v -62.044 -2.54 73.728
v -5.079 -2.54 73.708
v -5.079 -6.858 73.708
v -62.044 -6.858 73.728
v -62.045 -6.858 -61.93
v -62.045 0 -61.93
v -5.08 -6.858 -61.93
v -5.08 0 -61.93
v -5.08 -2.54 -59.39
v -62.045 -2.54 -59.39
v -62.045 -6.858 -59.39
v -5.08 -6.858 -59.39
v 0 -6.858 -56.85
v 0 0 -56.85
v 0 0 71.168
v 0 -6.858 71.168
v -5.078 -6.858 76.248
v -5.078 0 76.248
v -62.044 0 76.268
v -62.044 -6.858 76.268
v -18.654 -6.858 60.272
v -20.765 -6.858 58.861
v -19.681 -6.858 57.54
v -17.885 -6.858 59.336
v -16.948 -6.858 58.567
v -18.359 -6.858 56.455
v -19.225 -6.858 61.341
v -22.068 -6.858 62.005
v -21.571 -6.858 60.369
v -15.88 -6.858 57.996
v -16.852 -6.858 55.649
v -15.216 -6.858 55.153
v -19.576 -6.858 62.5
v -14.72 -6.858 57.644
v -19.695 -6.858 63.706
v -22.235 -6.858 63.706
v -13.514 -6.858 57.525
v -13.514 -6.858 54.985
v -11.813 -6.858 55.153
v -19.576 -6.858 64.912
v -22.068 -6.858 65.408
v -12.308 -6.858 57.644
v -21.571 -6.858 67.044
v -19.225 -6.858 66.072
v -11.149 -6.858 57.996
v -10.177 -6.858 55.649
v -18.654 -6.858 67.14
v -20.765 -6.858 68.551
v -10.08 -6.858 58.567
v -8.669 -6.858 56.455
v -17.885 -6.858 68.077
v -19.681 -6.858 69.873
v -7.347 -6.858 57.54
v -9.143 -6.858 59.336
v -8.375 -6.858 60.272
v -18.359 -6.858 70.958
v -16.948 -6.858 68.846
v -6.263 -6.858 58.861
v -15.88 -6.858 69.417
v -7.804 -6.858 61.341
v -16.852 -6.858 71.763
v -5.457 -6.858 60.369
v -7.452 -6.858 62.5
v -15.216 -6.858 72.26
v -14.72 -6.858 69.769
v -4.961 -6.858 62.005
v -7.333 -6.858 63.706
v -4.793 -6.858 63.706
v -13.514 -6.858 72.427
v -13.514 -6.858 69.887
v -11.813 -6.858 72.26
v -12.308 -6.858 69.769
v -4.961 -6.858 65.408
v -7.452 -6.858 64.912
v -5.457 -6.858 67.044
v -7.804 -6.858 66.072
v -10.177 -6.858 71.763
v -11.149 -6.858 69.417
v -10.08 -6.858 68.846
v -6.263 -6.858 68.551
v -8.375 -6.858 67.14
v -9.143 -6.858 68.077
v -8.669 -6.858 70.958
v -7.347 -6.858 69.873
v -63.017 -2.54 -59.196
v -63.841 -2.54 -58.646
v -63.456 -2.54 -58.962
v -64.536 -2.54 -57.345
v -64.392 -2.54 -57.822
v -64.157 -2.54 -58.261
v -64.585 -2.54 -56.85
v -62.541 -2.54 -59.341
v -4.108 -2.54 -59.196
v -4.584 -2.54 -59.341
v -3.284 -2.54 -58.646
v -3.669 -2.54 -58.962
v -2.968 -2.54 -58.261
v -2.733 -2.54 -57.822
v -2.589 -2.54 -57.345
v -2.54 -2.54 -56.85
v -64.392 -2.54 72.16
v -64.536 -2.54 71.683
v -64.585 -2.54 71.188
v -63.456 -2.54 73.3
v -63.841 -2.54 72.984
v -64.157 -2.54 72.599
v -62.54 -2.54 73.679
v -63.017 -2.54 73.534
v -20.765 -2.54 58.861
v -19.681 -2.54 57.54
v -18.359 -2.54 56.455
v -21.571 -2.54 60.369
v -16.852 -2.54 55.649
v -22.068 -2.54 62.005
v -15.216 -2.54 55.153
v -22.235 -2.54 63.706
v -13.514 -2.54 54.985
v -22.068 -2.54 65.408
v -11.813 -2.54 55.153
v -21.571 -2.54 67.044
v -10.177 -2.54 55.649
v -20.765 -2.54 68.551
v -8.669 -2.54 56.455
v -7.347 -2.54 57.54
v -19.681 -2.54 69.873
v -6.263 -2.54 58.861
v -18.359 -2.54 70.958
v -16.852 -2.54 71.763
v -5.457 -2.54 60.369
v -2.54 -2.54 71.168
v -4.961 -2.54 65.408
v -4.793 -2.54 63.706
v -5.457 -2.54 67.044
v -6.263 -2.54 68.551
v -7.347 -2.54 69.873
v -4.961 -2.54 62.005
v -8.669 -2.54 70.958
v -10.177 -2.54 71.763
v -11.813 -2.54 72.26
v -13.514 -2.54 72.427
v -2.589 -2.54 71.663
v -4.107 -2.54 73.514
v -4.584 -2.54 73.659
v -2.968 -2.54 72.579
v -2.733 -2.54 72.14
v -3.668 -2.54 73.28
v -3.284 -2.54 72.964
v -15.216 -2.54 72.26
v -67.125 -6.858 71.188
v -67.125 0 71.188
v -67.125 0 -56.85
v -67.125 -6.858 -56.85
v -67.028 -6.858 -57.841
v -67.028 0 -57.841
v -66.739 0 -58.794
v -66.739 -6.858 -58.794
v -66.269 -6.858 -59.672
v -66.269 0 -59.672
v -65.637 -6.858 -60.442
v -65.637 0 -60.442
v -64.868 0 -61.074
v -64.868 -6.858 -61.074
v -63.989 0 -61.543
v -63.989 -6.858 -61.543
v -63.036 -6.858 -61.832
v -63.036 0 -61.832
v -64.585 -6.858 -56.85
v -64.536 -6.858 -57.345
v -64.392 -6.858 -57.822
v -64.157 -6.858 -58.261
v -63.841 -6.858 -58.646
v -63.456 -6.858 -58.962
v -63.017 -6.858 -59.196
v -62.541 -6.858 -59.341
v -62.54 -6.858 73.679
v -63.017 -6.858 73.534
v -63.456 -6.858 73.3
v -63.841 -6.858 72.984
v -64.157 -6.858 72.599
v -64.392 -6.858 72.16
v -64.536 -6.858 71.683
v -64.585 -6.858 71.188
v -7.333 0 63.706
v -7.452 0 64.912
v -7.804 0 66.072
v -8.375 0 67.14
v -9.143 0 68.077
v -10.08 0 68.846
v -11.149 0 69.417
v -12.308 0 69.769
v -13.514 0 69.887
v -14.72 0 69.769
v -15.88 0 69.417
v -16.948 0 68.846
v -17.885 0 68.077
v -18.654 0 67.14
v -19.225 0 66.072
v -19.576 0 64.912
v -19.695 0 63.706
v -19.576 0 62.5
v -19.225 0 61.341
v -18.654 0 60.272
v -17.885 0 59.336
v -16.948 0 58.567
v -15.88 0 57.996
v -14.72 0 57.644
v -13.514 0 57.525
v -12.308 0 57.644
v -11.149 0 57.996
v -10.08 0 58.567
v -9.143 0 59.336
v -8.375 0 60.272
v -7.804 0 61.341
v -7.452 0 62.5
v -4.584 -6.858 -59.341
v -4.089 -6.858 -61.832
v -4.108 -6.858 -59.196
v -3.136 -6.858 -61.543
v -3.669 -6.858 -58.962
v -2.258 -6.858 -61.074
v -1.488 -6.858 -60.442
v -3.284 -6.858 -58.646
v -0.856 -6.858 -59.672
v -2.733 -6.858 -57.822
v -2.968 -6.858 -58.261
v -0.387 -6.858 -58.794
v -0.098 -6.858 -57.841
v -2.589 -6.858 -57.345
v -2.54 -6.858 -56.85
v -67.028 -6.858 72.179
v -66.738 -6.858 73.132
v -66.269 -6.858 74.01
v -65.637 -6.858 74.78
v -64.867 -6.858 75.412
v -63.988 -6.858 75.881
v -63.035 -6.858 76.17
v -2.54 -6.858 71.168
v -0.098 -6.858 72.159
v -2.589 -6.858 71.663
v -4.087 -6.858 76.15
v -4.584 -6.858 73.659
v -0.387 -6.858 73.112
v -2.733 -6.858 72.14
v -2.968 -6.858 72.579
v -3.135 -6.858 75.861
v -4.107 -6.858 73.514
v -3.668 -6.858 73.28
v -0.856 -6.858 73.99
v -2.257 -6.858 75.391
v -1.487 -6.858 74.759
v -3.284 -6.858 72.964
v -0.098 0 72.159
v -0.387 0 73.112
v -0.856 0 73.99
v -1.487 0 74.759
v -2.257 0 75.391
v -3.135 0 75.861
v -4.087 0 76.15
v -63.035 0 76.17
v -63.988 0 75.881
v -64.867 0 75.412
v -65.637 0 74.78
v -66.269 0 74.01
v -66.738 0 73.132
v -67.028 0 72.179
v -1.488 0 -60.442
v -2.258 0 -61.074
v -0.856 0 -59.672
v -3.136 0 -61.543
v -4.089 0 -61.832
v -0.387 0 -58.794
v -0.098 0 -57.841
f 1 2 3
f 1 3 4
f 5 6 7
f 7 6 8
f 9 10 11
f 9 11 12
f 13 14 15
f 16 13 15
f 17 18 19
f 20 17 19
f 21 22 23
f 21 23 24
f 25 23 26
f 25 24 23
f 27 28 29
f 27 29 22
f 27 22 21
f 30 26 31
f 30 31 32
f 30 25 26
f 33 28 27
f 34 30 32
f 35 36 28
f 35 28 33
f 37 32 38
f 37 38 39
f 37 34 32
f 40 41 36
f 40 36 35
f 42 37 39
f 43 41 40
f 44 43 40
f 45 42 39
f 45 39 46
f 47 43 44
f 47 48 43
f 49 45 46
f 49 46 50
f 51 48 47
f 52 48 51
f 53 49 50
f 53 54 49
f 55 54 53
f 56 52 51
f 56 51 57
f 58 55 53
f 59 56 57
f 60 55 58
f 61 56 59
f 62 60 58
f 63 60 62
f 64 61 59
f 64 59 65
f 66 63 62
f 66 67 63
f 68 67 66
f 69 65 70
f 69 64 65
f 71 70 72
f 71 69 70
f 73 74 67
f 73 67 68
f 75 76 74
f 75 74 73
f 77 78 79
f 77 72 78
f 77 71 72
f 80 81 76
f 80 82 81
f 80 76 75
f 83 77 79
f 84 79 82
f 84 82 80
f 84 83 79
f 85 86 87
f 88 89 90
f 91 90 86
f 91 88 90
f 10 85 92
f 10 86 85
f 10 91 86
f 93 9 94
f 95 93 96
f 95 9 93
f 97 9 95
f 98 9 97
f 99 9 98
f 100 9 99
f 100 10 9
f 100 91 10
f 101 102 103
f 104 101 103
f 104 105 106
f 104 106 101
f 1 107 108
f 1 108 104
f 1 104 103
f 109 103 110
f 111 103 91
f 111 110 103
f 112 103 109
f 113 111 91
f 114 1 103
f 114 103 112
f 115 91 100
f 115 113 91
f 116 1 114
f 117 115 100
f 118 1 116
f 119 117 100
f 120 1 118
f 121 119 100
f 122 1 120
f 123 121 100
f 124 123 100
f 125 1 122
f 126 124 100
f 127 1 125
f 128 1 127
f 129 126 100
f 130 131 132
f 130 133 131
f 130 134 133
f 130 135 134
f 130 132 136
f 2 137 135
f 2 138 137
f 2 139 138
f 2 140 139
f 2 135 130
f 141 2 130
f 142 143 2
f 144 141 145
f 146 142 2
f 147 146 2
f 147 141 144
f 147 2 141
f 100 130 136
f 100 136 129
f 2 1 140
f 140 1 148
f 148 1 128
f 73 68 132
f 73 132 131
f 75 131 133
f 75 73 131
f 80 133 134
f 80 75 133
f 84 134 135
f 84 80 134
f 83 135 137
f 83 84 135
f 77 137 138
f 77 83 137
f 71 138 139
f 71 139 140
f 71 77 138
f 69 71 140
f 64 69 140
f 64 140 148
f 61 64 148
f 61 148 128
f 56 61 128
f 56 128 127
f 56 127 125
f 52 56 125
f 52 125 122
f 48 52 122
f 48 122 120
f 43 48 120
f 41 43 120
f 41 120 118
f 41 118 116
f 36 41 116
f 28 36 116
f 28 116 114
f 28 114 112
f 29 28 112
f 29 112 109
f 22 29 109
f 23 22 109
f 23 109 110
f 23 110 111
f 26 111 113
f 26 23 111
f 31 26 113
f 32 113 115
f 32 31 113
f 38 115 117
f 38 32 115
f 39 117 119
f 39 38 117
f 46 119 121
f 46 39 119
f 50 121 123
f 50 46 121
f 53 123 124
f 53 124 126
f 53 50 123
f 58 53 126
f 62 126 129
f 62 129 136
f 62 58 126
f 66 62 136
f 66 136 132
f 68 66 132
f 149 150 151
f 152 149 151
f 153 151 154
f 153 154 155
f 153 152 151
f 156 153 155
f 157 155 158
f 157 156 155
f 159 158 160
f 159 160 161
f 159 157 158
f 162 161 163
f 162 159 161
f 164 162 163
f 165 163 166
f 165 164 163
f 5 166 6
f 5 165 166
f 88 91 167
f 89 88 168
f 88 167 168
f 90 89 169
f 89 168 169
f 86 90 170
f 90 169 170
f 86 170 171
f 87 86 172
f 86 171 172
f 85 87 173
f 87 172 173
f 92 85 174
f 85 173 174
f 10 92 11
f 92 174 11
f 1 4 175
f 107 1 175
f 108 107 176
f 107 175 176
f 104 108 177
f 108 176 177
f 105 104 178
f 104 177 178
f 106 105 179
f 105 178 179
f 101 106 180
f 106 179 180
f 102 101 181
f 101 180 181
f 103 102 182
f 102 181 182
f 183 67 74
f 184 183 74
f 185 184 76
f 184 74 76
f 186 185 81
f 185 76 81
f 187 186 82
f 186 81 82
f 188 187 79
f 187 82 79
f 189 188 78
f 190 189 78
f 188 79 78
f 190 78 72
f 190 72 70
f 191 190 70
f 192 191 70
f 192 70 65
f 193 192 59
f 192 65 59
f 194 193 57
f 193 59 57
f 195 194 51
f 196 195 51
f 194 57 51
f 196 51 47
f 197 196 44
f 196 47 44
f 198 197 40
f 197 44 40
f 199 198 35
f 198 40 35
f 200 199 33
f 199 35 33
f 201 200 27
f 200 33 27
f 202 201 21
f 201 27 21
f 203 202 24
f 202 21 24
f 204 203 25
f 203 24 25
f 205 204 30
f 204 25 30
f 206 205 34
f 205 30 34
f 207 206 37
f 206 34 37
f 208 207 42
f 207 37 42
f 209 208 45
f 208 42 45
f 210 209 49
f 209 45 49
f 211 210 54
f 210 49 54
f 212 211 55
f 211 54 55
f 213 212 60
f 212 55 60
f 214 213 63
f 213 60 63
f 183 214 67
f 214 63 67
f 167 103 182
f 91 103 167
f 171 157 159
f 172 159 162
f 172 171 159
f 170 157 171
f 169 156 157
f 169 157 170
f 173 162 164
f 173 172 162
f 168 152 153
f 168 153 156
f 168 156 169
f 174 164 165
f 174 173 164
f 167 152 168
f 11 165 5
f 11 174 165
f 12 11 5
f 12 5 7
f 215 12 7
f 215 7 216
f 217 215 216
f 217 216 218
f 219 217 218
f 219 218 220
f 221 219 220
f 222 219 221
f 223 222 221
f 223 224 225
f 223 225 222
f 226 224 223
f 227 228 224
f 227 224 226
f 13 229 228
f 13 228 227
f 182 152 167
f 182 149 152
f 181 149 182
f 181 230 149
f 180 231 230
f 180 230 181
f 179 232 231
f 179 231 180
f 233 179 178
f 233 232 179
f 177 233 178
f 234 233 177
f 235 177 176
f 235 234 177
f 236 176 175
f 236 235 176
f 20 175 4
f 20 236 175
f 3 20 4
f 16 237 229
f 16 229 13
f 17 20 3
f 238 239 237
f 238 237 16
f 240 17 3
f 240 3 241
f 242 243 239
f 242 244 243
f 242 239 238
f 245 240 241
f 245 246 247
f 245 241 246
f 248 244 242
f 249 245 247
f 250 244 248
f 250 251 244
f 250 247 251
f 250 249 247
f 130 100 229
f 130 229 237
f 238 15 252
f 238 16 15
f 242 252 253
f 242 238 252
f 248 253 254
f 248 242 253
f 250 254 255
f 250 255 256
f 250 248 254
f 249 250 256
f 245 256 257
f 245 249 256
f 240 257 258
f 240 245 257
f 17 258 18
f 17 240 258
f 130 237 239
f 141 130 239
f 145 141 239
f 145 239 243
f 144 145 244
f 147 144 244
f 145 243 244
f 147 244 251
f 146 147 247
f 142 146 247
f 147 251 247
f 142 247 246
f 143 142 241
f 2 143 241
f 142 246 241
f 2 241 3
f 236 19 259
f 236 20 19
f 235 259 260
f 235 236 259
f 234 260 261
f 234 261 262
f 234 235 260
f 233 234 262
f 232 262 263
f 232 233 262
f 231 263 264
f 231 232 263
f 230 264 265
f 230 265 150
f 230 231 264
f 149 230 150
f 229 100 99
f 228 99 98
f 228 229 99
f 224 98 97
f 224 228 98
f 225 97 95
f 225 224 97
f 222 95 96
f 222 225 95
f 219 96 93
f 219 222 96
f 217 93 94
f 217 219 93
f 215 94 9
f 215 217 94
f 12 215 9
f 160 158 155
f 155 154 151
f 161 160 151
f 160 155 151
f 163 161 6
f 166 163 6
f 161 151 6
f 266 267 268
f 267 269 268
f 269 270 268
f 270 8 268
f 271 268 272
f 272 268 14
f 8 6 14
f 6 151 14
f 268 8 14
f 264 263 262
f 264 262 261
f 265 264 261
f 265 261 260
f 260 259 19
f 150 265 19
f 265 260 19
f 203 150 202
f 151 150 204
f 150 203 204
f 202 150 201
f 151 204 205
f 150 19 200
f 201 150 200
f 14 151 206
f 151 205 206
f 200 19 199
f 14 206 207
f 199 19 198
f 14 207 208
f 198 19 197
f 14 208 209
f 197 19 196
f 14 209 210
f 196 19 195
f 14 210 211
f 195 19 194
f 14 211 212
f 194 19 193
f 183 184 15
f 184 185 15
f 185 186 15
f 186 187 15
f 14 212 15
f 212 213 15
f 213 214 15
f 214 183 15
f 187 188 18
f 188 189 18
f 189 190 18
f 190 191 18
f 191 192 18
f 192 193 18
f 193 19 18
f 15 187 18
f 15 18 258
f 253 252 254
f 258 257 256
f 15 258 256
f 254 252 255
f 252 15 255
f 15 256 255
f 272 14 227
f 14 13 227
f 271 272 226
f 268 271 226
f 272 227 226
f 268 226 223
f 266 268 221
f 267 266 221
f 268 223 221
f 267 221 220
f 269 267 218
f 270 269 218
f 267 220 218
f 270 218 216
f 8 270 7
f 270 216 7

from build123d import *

# Parameters (mm, degrees)
F1_DEPTH = 6.858
F2_R     = 5.08
F3_R     = 6.181057
F4_DEPTH = 6.858
F6_T     = -2.54


with BuildPart() as f1:
    # F0 (on Front) → F1 (new body)
    with BuildSketch(Plane.XZ):
        Polygon((0, -61.929818), (0, 76.246182), (-67.125276, 76.269276), (-67.125276, -61.929818), align=None)
    extrude(amount=F1_DEPTH)

    # F2
    f2_edges = [f1.edges().sort_by_distance(p)[0] for p in [
        (-67.125276, -3.429, 76.269276),
        (0, -3.429, -61.929818),
        (-67.125276, -3.429, -61.929818),
        (0, -3.429, 76.246182),
    ]]
    fillet(f2_edges, radius=F2_R)

    # F3 (on face) → F4 (cut)
    with BuildSketch(Plane.XZ.offset(6.858)):
        with Locations((-13.514167, 63.706279)):
            Circle(F3_R)
    extrude(amount=-F4_DEPTH, mode=Mode.SUBTRACT)

    # F6
    f6_openings = [f1.faces().sort_by_distance(p)[0] for p in [
        (-33.827013, -6.858, 6.420933),
    ]]
    offset(amount=F6_T, openings=f6_openings)


solid = f1.part
